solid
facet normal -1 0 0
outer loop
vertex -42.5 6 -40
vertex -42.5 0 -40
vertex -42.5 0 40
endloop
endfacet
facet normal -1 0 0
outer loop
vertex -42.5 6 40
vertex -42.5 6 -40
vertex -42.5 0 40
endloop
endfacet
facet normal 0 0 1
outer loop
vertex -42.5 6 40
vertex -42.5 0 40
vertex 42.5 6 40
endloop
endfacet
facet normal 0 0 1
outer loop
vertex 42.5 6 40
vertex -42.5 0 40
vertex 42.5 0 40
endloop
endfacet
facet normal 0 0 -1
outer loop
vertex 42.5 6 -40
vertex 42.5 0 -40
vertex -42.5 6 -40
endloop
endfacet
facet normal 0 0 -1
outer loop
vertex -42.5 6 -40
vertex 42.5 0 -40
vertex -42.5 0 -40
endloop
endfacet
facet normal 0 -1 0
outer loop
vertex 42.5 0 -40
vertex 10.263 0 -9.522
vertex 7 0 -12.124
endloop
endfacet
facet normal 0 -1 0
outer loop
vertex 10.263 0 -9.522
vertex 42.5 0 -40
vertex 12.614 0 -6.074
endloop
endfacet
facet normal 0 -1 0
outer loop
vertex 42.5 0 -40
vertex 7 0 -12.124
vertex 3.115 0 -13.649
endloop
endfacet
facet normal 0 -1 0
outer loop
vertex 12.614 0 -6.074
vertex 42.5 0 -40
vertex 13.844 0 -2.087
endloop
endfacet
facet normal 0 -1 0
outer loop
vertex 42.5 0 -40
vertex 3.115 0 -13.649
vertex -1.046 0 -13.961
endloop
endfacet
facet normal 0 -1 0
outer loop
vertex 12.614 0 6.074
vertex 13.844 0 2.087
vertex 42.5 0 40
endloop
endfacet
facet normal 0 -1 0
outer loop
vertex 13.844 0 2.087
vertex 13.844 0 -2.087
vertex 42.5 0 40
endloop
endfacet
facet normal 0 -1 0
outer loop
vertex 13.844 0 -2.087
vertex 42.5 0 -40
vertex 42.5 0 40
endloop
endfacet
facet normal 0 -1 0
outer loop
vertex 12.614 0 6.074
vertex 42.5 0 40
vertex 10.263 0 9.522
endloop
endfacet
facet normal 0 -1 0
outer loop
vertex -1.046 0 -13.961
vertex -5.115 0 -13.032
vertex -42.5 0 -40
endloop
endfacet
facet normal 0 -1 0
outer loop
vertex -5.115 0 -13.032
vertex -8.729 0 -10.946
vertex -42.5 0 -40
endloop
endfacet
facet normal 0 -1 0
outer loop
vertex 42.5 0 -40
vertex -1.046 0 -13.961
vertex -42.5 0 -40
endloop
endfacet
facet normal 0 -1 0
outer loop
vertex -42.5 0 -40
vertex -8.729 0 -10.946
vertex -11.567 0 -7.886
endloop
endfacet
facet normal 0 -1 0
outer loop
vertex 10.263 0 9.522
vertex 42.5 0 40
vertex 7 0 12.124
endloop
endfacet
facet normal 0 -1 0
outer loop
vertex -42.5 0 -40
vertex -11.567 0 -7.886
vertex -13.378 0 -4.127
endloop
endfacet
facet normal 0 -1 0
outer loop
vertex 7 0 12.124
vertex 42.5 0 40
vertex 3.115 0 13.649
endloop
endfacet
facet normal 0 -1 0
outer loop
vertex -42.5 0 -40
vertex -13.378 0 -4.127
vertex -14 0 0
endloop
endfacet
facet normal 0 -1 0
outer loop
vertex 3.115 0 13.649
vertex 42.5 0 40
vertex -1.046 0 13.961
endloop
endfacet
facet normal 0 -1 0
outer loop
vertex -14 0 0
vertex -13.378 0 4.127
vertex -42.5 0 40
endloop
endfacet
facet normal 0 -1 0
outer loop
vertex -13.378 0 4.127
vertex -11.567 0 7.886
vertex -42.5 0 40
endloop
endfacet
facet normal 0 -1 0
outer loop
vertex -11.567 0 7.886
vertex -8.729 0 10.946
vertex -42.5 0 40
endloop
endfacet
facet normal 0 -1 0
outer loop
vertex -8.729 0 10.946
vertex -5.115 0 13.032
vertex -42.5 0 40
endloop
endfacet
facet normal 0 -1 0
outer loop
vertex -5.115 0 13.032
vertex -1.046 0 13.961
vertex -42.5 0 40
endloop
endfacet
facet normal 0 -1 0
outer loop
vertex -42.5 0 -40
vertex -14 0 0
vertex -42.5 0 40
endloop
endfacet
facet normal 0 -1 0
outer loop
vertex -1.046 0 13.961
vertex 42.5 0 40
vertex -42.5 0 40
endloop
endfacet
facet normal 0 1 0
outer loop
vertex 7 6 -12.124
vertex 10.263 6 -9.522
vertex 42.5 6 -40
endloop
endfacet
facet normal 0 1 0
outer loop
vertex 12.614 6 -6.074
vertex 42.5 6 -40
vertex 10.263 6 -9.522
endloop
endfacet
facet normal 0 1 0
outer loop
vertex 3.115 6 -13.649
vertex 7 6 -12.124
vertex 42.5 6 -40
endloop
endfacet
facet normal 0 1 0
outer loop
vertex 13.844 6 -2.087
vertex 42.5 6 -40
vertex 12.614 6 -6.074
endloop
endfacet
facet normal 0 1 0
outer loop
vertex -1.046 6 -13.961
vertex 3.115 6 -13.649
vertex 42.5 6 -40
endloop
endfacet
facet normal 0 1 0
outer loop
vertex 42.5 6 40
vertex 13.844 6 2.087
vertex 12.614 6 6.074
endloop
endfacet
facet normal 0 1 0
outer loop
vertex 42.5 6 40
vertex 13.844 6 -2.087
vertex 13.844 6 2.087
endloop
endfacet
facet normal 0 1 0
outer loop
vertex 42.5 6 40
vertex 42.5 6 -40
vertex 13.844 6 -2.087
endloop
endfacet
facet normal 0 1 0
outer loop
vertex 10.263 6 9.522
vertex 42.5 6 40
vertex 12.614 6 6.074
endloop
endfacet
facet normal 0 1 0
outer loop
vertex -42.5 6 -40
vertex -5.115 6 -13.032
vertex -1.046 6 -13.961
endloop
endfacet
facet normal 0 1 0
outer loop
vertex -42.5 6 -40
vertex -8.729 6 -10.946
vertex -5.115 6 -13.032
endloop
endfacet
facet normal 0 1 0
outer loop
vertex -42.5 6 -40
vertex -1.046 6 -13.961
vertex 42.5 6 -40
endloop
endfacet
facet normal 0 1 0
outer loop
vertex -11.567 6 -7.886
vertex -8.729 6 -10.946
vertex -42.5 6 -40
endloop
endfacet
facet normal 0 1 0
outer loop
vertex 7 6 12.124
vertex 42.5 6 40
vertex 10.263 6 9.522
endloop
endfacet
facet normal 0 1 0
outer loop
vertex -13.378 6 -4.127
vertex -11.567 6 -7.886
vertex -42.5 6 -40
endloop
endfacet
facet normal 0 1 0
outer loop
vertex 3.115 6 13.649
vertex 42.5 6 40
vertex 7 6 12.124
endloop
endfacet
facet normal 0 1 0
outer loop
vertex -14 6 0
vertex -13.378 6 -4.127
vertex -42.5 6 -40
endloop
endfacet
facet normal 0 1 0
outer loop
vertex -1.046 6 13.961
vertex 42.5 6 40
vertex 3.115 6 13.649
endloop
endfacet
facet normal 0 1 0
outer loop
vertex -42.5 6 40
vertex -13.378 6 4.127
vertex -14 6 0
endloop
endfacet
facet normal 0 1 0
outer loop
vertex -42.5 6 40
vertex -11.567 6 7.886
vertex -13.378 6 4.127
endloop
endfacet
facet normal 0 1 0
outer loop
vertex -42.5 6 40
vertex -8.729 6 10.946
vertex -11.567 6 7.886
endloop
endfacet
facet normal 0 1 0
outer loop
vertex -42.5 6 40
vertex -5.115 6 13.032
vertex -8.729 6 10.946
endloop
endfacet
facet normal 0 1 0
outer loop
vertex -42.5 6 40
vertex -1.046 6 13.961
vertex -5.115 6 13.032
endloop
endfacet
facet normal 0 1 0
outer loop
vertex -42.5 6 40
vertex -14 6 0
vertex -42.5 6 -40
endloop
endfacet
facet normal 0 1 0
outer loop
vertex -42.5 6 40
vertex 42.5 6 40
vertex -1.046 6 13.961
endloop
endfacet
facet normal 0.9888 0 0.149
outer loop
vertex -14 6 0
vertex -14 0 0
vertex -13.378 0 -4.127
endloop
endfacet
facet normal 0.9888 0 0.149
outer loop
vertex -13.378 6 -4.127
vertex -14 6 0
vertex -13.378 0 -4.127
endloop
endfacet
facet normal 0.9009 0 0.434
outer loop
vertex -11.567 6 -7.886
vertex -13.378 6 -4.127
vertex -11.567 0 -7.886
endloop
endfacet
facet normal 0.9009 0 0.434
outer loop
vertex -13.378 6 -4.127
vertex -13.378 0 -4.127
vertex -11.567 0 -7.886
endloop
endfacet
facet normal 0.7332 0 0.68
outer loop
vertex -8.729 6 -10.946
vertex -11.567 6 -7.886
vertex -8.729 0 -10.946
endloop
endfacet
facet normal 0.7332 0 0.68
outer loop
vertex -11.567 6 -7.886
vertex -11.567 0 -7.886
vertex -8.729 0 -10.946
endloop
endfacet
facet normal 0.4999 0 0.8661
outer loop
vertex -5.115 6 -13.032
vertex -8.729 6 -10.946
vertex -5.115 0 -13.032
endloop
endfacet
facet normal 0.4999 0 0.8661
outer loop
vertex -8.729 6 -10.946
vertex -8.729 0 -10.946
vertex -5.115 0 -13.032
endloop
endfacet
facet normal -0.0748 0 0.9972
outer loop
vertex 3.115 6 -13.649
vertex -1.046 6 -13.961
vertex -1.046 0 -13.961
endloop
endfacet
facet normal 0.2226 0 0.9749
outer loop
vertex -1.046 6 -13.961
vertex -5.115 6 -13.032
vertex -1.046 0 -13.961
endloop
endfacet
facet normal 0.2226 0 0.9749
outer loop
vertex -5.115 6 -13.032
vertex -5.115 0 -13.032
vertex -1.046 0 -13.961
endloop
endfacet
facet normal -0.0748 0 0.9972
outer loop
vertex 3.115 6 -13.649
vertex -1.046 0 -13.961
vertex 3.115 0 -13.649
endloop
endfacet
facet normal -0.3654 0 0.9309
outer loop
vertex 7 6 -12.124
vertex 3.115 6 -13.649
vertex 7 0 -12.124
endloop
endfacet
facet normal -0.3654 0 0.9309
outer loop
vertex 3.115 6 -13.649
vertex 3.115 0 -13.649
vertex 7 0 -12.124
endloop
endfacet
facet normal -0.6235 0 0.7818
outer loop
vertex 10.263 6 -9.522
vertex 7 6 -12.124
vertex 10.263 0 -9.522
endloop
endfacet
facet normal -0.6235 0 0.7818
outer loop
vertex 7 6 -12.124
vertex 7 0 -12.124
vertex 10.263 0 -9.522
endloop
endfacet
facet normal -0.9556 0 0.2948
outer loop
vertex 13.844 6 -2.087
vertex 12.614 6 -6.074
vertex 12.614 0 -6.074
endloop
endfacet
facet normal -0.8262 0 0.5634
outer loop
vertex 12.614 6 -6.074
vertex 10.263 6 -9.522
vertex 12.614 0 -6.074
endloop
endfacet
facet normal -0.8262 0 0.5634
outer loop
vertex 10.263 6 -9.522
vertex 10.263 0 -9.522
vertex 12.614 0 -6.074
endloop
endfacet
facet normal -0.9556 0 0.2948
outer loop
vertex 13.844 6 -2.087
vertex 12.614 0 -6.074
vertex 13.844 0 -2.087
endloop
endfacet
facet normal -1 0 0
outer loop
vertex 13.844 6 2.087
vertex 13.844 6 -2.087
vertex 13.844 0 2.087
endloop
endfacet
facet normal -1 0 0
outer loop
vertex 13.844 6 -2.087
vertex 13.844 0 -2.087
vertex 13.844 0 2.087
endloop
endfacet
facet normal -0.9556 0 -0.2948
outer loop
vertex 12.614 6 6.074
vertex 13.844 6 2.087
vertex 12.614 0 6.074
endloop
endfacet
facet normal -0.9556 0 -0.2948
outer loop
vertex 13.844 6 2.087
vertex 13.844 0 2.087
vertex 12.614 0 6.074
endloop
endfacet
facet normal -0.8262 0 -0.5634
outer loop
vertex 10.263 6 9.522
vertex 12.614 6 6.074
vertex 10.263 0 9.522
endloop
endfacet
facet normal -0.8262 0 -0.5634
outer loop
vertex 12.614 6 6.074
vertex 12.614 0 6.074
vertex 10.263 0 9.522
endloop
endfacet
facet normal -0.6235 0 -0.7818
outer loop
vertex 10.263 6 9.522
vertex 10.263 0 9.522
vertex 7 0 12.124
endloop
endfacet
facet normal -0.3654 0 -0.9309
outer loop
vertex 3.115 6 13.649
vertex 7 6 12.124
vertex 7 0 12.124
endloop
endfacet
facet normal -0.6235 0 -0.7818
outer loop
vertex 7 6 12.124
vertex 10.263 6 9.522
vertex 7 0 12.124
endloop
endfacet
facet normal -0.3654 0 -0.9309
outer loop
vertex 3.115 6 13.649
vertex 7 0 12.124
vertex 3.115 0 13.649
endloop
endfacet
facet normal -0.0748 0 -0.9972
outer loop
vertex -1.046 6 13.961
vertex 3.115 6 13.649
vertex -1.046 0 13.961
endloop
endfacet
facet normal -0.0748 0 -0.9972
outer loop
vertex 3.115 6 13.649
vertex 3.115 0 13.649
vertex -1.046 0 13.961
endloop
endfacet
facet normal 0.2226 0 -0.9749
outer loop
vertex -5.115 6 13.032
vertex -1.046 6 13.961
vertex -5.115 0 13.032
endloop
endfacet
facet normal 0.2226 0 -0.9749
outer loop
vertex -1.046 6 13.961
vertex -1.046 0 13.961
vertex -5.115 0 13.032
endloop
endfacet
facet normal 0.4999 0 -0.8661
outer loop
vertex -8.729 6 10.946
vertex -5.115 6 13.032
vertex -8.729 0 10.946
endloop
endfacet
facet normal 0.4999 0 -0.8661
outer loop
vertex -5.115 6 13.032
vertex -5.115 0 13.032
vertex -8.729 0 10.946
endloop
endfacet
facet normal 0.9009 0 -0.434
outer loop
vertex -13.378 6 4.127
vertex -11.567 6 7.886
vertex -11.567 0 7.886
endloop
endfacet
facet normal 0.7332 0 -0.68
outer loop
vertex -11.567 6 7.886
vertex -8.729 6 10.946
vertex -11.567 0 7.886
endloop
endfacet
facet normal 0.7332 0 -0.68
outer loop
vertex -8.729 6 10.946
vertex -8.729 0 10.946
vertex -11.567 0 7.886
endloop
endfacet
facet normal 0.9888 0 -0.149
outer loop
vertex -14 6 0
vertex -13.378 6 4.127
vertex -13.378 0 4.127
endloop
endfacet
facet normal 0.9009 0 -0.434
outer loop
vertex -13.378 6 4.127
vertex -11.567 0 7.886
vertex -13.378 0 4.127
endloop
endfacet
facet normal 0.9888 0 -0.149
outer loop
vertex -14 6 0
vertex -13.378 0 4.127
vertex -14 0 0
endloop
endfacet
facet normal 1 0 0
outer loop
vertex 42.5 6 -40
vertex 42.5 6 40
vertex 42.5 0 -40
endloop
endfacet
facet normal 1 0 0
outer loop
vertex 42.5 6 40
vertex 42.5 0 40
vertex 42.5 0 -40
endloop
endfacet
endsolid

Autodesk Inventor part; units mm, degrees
ref_plane "YZ Plane" through (0, 0, 0) normal (1, 0, 0) x (0, 1, 0)
ref_plane "XZ Plane" through (0, 0, 0) normal (0, 1, 0) x (-1, 0, 0)
ref_plane "XY Plane" through (0, 0, 0) normal (0, 0, 1) x (1, 0, 0)
sketch "Sketch1" plane through (0, 0, 0) normal (0, 1, 0) x (-1, 0, 0)
  line L0 (-42.5, -40) -> (42.5, -40)
  line L1 (42.5, -40) -> (42.5, 40)
  line L2 (42.5, 40) -> (-42.5, 40)
  line L3 (-42.5, 40) -> (-42.5, -40)
  line L4 (-42.5, -40) -> (42.5, 40) construction
  line L5 (42.5, -40) -> (-42.5, 40) construction
  circle A0 centre (0, 0) radius 14
  dimension "d0" = 85
  dimension "d1" = 80
  dimension "d4" = 28
extrude "Extrusion1" add sketch "Sketch1" along normal blind 6
properties part number "segment0b" material "Plywood, Finish"
